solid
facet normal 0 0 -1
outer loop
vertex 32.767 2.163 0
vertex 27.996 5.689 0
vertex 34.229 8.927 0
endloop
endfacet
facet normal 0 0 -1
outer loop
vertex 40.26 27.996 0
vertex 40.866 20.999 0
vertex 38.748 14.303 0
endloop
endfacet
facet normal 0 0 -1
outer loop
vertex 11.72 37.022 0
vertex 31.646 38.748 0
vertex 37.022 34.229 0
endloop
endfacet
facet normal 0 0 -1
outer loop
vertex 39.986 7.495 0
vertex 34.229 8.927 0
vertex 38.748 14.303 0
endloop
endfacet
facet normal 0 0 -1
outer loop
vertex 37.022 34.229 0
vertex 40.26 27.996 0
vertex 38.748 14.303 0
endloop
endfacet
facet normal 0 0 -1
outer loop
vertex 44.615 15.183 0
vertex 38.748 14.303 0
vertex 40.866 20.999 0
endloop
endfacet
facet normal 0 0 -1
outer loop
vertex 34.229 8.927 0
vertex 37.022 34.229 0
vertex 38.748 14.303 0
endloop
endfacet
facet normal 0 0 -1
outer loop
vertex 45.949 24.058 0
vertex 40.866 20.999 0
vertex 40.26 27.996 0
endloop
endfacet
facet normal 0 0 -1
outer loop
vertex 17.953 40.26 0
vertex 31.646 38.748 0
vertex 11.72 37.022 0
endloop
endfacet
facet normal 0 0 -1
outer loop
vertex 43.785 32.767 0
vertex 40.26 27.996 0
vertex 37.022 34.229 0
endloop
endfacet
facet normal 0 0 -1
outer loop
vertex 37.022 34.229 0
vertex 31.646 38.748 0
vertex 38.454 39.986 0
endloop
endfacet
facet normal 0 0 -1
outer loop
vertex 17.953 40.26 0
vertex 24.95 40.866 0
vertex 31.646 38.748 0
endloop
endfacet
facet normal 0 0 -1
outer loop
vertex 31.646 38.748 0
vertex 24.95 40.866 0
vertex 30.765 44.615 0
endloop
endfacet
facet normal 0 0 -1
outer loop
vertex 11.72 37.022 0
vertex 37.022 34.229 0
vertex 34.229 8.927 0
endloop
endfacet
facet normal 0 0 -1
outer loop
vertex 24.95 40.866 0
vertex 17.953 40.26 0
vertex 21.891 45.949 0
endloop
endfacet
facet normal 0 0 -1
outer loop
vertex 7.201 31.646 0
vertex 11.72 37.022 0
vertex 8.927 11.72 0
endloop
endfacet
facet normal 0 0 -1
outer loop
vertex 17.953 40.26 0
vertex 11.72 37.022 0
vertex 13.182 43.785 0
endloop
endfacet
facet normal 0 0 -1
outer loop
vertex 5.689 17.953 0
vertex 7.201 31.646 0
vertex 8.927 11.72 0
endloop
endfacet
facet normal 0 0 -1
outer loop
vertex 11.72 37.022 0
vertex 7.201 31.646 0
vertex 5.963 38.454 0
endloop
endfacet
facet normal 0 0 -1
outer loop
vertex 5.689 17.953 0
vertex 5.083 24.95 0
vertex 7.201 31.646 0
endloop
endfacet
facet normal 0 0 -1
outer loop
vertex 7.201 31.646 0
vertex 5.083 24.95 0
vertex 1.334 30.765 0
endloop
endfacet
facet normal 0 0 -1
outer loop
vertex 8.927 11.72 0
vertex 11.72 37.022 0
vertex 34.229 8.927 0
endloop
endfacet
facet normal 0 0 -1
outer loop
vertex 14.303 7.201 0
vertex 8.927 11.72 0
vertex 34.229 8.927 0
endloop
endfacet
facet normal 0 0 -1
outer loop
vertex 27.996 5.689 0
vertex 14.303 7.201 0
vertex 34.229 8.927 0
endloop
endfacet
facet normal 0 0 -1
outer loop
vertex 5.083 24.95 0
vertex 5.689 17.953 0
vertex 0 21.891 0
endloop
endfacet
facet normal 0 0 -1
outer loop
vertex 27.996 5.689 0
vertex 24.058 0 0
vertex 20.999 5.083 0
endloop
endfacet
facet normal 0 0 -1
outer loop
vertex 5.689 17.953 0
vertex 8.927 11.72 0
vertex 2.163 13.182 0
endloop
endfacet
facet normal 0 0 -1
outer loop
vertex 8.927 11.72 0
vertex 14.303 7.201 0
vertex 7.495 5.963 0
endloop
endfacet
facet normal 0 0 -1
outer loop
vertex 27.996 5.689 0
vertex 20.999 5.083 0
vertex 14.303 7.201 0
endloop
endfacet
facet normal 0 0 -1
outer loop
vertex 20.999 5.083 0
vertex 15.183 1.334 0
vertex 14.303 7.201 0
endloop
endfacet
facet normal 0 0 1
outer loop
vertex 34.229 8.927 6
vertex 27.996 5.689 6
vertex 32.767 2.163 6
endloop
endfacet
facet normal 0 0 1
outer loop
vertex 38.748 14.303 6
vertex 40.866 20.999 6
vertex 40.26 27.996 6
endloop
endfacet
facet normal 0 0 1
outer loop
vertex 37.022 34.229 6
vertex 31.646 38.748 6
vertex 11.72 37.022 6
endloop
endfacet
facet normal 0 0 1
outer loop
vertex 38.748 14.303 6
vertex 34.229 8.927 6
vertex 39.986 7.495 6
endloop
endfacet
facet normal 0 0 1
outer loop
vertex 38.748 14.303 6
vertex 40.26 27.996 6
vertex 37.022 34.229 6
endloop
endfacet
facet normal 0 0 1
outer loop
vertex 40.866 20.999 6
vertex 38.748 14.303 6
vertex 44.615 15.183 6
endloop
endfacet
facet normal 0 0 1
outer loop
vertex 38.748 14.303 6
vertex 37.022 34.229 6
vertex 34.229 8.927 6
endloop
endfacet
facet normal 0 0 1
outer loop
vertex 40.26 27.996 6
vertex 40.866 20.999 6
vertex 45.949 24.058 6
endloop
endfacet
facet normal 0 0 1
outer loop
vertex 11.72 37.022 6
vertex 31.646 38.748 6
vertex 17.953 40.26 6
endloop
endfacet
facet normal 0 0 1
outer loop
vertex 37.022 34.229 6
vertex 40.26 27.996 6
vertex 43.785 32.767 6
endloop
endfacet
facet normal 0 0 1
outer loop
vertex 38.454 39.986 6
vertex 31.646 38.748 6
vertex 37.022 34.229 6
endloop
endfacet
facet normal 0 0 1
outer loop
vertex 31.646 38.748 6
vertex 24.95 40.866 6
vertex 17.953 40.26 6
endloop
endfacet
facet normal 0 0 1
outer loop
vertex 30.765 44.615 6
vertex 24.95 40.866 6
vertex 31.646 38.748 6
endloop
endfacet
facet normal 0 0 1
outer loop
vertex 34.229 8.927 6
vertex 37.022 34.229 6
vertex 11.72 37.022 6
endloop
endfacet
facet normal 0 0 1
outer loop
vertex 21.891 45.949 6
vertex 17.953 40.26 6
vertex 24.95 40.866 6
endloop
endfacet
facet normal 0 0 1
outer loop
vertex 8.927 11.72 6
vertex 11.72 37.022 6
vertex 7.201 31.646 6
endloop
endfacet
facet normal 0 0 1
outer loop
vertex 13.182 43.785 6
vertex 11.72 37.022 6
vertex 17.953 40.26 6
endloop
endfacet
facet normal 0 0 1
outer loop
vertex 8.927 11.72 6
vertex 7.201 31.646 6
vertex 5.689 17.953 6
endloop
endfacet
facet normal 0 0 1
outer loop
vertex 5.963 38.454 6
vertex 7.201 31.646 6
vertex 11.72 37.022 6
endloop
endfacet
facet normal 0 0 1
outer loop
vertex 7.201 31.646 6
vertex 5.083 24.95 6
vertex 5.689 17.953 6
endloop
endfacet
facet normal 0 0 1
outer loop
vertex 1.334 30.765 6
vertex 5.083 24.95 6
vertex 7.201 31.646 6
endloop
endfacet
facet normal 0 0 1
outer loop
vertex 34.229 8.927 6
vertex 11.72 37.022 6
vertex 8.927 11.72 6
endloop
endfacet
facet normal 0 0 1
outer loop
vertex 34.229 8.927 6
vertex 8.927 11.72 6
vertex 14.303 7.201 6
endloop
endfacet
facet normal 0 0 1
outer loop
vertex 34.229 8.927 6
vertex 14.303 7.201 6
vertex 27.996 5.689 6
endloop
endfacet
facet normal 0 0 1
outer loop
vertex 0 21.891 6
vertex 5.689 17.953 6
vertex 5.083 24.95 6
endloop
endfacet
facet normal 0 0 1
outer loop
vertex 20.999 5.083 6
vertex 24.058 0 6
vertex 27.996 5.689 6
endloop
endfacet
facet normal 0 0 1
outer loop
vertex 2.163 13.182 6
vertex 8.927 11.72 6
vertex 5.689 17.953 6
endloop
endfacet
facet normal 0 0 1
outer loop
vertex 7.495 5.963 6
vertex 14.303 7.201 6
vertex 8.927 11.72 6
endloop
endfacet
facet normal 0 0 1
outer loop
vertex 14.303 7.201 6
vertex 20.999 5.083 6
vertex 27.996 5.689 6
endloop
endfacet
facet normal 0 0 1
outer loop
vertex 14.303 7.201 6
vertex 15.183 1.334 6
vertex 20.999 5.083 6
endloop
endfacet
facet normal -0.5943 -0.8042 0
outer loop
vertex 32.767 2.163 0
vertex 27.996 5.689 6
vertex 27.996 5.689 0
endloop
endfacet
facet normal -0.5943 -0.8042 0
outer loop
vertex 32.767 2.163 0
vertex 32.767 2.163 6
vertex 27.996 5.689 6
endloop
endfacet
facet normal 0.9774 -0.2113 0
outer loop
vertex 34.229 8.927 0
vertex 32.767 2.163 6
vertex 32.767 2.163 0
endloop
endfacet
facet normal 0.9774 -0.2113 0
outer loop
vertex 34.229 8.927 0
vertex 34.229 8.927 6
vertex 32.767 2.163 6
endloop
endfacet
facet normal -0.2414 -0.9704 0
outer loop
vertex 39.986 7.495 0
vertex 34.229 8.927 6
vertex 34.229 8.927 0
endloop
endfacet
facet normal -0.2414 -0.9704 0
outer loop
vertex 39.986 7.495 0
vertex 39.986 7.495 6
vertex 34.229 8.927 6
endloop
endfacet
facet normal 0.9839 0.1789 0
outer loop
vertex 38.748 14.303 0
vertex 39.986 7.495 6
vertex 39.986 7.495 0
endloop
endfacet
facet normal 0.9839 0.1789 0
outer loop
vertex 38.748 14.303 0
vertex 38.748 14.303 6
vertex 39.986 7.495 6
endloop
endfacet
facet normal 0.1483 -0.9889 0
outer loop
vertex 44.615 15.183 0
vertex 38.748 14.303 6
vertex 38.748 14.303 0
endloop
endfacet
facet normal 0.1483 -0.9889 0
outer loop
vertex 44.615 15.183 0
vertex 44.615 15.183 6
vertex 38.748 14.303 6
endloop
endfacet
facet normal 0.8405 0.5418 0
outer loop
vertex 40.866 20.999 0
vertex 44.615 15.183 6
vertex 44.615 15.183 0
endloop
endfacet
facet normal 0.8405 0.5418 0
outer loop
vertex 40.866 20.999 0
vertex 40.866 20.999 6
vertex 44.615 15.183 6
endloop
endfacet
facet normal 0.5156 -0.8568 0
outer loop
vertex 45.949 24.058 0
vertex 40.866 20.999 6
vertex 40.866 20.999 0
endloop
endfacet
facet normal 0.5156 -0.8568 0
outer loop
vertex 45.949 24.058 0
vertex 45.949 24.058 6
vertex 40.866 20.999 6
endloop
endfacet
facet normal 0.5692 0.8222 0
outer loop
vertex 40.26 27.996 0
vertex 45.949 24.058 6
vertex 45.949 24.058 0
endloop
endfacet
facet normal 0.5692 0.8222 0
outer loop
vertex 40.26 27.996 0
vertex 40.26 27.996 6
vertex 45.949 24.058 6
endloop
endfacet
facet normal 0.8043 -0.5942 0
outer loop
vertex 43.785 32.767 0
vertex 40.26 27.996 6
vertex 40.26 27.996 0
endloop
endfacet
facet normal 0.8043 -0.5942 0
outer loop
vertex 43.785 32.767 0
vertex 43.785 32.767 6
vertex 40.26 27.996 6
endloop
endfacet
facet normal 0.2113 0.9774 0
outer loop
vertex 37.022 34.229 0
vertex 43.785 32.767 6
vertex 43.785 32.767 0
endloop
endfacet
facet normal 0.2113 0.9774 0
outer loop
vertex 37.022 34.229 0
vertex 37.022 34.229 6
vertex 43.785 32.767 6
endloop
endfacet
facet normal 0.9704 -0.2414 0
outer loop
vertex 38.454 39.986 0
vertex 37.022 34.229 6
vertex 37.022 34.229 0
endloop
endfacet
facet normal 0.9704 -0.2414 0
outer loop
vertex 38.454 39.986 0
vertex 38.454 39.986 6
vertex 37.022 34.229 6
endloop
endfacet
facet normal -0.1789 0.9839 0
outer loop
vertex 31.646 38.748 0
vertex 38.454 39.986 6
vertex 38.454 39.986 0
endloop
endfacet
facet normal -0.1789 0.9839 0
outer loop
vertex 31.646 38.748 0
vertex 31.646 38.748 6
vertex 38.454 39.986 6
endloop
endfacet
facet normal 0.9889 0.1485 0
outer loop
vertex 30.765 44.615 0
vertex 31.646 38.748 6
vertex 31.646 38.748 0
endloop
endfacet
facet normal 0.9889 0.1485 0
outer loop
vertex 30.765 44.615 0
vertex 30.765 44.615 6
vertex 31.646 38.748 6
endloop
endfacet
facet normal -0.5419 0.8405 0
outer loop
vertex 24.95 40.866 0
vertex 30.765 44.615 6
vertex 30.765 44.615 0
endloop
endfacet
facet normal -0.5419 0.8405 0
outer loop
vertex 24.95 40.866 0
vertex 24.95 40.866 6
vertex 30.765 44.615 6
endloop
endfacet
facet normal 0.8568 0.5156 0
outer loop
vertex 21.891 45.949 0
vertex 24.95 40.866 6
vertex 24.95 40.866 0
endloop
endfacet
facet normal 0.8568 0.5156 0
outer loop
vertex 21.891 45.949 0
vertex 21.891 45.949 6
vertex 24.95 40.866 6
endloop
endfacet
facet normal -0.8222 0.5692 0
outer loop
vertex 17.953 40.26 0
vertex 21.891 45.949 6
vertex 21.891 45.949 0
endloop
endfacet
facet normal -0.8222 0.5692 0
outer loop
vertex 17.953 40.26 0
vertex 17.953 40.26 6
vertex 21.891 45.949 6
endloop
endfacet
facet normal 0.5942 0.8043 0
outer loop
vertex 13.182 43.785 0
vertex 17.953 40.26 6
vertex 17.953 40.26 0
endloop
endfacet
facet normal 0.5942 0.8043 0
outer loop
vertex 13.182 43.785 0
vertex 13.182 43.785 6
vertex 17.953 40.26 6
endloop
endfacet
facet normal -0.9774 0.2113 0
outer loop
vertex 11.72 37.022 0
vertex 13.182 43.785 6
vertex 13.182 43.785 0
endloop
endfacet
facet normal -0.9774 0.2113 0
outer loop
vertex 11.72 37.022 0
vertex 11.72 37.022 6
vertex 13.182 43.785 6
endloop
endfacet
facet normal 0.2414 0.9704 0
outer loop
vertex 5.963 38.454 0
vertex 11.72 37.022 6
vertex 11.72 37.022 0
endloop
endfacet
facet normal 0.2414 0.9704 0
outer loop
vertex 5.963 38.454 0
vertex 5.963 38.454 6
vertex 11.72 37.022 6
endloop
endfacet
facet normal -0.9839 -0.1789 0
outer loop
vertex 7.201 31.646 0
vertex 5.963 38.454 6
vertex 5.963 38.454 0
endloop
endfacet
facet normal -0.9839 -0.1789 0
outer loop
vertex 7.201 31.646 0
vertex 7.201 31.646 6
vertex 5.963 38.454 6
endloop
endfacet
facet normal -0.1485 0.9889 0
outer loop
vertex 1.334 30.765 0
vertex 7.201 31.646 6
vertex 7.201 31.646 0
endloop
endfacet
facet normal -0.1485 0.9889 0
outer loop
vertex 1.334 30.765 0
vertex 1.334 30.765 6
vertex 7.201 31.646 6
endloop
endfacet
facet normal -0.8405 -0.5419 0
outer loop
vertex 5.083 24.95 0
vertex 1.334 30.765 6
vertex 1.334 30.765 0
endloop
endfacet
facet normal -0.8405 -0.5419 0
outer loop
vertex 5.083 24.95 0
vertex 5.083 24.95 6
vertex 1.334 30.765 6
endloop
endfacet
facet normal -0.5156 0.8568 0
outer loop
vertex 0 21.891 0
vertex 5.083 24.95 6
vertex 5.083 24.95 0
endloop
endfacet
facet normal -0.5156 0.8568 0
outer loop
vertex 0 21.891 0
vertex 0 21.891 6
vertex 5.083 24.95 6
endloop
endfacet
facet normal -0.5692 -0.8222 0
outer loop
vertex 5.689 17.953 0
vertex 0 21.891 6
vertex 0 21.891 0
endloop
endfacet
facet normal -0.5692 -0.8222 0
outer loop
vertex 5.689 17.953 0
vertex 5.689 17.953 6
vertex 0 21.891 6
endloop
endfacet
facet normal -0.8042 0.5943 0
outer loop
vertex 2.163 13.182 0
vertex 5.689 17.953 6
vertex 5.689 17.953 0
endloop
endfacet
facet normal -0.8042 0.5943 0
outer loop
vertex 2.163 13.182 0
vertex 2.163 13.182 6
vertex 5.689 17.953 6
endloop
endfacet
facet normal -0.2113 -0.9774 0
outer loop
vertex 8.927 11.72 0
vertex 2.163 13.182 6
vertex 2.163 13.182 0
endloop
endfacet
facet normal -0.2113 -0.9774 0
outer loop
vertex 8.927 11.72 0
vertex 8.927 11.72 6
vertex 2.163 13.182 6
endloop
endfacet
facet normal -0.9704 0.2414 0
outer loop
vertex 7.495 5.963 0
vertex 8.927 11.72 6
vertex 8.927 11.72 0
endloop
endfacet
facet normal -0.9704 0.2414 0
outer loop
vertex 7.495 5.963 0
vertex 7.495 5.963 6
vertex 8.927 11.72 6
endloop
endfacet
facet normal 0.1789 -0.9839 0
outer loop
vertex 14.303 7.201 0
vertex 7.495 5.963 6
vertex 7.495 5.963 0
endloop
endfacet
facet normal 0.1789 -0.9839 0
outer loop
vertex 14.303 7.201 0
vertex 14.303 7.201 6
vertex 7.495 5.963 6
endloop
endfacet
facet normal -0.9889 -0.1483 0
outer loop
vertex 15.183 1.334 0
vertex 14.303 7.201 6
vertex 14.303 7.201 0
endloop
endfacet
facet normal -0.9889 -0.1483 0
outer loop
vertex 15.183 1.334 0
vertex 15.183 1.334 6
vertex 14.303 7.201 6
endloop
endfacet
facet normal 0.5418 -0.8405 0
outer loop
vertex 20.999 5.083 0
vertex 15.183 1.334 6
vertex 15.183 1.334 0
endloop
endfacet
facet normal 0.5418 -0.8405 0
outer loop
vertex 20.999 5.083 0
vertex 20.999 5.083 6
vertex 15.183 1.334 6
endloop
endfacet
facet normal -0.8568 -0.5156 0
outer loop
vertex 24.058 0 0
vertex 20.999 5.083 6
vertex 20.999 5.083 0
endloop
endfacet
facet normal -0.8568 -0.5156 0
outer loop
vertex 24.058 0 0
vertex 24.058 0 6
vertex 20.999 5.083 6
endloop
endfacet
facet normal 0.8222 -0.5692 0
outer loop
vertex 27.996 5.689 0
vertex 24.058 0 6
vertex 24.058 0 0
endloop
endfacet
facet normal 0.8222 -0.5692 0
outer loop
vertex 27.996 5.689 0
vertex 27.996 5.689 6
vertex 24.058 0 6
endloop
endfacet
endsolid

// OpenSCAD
$fn = 32;

// ----------------------------------------------------------------------
// Chain sprocket: 16 teeth, 18 mm root radius
// ----------------------------------------------------------------------

// --- parameters (mm) ---
profile_height = 6;       // extrusion height
profile_points = 32;      // points of the closed outline

profile = [[40.866, 20.999], [45.949, 24.058], [40.26, 27.996], [43.785, 32.767], [37.022, 34.229], [38.454, 39.986], [31.646, 38.748], [30.765, 44.615], [24.95, 40.866], [21.891, 45.949], [17.953, 40.26], [13.182, 43.785], [11.72, 37.022], [5.963, 38.454], [7.201, 31.646], [1.334, 30.765], [5.083, 24.95], [0, 21.891], [5.689, 17.953], [2.163, 13.182], [8.927, 11.72], [7.495, 5.963], [14.303, 7.201], [15.183, 1.334], [20.999, 5.083], [24.058, 0], [27.996, 5.689], [32.767, 2.163], [34.229, 8.927], [39.986, 7.495], [38.748, 14.303], [44.615, 15.183]];  // single closed polygon, 32 points, counter clockwise

// --- the one profile operation ---
linear_extrude(height = profile_height) polygon(points = profile);
